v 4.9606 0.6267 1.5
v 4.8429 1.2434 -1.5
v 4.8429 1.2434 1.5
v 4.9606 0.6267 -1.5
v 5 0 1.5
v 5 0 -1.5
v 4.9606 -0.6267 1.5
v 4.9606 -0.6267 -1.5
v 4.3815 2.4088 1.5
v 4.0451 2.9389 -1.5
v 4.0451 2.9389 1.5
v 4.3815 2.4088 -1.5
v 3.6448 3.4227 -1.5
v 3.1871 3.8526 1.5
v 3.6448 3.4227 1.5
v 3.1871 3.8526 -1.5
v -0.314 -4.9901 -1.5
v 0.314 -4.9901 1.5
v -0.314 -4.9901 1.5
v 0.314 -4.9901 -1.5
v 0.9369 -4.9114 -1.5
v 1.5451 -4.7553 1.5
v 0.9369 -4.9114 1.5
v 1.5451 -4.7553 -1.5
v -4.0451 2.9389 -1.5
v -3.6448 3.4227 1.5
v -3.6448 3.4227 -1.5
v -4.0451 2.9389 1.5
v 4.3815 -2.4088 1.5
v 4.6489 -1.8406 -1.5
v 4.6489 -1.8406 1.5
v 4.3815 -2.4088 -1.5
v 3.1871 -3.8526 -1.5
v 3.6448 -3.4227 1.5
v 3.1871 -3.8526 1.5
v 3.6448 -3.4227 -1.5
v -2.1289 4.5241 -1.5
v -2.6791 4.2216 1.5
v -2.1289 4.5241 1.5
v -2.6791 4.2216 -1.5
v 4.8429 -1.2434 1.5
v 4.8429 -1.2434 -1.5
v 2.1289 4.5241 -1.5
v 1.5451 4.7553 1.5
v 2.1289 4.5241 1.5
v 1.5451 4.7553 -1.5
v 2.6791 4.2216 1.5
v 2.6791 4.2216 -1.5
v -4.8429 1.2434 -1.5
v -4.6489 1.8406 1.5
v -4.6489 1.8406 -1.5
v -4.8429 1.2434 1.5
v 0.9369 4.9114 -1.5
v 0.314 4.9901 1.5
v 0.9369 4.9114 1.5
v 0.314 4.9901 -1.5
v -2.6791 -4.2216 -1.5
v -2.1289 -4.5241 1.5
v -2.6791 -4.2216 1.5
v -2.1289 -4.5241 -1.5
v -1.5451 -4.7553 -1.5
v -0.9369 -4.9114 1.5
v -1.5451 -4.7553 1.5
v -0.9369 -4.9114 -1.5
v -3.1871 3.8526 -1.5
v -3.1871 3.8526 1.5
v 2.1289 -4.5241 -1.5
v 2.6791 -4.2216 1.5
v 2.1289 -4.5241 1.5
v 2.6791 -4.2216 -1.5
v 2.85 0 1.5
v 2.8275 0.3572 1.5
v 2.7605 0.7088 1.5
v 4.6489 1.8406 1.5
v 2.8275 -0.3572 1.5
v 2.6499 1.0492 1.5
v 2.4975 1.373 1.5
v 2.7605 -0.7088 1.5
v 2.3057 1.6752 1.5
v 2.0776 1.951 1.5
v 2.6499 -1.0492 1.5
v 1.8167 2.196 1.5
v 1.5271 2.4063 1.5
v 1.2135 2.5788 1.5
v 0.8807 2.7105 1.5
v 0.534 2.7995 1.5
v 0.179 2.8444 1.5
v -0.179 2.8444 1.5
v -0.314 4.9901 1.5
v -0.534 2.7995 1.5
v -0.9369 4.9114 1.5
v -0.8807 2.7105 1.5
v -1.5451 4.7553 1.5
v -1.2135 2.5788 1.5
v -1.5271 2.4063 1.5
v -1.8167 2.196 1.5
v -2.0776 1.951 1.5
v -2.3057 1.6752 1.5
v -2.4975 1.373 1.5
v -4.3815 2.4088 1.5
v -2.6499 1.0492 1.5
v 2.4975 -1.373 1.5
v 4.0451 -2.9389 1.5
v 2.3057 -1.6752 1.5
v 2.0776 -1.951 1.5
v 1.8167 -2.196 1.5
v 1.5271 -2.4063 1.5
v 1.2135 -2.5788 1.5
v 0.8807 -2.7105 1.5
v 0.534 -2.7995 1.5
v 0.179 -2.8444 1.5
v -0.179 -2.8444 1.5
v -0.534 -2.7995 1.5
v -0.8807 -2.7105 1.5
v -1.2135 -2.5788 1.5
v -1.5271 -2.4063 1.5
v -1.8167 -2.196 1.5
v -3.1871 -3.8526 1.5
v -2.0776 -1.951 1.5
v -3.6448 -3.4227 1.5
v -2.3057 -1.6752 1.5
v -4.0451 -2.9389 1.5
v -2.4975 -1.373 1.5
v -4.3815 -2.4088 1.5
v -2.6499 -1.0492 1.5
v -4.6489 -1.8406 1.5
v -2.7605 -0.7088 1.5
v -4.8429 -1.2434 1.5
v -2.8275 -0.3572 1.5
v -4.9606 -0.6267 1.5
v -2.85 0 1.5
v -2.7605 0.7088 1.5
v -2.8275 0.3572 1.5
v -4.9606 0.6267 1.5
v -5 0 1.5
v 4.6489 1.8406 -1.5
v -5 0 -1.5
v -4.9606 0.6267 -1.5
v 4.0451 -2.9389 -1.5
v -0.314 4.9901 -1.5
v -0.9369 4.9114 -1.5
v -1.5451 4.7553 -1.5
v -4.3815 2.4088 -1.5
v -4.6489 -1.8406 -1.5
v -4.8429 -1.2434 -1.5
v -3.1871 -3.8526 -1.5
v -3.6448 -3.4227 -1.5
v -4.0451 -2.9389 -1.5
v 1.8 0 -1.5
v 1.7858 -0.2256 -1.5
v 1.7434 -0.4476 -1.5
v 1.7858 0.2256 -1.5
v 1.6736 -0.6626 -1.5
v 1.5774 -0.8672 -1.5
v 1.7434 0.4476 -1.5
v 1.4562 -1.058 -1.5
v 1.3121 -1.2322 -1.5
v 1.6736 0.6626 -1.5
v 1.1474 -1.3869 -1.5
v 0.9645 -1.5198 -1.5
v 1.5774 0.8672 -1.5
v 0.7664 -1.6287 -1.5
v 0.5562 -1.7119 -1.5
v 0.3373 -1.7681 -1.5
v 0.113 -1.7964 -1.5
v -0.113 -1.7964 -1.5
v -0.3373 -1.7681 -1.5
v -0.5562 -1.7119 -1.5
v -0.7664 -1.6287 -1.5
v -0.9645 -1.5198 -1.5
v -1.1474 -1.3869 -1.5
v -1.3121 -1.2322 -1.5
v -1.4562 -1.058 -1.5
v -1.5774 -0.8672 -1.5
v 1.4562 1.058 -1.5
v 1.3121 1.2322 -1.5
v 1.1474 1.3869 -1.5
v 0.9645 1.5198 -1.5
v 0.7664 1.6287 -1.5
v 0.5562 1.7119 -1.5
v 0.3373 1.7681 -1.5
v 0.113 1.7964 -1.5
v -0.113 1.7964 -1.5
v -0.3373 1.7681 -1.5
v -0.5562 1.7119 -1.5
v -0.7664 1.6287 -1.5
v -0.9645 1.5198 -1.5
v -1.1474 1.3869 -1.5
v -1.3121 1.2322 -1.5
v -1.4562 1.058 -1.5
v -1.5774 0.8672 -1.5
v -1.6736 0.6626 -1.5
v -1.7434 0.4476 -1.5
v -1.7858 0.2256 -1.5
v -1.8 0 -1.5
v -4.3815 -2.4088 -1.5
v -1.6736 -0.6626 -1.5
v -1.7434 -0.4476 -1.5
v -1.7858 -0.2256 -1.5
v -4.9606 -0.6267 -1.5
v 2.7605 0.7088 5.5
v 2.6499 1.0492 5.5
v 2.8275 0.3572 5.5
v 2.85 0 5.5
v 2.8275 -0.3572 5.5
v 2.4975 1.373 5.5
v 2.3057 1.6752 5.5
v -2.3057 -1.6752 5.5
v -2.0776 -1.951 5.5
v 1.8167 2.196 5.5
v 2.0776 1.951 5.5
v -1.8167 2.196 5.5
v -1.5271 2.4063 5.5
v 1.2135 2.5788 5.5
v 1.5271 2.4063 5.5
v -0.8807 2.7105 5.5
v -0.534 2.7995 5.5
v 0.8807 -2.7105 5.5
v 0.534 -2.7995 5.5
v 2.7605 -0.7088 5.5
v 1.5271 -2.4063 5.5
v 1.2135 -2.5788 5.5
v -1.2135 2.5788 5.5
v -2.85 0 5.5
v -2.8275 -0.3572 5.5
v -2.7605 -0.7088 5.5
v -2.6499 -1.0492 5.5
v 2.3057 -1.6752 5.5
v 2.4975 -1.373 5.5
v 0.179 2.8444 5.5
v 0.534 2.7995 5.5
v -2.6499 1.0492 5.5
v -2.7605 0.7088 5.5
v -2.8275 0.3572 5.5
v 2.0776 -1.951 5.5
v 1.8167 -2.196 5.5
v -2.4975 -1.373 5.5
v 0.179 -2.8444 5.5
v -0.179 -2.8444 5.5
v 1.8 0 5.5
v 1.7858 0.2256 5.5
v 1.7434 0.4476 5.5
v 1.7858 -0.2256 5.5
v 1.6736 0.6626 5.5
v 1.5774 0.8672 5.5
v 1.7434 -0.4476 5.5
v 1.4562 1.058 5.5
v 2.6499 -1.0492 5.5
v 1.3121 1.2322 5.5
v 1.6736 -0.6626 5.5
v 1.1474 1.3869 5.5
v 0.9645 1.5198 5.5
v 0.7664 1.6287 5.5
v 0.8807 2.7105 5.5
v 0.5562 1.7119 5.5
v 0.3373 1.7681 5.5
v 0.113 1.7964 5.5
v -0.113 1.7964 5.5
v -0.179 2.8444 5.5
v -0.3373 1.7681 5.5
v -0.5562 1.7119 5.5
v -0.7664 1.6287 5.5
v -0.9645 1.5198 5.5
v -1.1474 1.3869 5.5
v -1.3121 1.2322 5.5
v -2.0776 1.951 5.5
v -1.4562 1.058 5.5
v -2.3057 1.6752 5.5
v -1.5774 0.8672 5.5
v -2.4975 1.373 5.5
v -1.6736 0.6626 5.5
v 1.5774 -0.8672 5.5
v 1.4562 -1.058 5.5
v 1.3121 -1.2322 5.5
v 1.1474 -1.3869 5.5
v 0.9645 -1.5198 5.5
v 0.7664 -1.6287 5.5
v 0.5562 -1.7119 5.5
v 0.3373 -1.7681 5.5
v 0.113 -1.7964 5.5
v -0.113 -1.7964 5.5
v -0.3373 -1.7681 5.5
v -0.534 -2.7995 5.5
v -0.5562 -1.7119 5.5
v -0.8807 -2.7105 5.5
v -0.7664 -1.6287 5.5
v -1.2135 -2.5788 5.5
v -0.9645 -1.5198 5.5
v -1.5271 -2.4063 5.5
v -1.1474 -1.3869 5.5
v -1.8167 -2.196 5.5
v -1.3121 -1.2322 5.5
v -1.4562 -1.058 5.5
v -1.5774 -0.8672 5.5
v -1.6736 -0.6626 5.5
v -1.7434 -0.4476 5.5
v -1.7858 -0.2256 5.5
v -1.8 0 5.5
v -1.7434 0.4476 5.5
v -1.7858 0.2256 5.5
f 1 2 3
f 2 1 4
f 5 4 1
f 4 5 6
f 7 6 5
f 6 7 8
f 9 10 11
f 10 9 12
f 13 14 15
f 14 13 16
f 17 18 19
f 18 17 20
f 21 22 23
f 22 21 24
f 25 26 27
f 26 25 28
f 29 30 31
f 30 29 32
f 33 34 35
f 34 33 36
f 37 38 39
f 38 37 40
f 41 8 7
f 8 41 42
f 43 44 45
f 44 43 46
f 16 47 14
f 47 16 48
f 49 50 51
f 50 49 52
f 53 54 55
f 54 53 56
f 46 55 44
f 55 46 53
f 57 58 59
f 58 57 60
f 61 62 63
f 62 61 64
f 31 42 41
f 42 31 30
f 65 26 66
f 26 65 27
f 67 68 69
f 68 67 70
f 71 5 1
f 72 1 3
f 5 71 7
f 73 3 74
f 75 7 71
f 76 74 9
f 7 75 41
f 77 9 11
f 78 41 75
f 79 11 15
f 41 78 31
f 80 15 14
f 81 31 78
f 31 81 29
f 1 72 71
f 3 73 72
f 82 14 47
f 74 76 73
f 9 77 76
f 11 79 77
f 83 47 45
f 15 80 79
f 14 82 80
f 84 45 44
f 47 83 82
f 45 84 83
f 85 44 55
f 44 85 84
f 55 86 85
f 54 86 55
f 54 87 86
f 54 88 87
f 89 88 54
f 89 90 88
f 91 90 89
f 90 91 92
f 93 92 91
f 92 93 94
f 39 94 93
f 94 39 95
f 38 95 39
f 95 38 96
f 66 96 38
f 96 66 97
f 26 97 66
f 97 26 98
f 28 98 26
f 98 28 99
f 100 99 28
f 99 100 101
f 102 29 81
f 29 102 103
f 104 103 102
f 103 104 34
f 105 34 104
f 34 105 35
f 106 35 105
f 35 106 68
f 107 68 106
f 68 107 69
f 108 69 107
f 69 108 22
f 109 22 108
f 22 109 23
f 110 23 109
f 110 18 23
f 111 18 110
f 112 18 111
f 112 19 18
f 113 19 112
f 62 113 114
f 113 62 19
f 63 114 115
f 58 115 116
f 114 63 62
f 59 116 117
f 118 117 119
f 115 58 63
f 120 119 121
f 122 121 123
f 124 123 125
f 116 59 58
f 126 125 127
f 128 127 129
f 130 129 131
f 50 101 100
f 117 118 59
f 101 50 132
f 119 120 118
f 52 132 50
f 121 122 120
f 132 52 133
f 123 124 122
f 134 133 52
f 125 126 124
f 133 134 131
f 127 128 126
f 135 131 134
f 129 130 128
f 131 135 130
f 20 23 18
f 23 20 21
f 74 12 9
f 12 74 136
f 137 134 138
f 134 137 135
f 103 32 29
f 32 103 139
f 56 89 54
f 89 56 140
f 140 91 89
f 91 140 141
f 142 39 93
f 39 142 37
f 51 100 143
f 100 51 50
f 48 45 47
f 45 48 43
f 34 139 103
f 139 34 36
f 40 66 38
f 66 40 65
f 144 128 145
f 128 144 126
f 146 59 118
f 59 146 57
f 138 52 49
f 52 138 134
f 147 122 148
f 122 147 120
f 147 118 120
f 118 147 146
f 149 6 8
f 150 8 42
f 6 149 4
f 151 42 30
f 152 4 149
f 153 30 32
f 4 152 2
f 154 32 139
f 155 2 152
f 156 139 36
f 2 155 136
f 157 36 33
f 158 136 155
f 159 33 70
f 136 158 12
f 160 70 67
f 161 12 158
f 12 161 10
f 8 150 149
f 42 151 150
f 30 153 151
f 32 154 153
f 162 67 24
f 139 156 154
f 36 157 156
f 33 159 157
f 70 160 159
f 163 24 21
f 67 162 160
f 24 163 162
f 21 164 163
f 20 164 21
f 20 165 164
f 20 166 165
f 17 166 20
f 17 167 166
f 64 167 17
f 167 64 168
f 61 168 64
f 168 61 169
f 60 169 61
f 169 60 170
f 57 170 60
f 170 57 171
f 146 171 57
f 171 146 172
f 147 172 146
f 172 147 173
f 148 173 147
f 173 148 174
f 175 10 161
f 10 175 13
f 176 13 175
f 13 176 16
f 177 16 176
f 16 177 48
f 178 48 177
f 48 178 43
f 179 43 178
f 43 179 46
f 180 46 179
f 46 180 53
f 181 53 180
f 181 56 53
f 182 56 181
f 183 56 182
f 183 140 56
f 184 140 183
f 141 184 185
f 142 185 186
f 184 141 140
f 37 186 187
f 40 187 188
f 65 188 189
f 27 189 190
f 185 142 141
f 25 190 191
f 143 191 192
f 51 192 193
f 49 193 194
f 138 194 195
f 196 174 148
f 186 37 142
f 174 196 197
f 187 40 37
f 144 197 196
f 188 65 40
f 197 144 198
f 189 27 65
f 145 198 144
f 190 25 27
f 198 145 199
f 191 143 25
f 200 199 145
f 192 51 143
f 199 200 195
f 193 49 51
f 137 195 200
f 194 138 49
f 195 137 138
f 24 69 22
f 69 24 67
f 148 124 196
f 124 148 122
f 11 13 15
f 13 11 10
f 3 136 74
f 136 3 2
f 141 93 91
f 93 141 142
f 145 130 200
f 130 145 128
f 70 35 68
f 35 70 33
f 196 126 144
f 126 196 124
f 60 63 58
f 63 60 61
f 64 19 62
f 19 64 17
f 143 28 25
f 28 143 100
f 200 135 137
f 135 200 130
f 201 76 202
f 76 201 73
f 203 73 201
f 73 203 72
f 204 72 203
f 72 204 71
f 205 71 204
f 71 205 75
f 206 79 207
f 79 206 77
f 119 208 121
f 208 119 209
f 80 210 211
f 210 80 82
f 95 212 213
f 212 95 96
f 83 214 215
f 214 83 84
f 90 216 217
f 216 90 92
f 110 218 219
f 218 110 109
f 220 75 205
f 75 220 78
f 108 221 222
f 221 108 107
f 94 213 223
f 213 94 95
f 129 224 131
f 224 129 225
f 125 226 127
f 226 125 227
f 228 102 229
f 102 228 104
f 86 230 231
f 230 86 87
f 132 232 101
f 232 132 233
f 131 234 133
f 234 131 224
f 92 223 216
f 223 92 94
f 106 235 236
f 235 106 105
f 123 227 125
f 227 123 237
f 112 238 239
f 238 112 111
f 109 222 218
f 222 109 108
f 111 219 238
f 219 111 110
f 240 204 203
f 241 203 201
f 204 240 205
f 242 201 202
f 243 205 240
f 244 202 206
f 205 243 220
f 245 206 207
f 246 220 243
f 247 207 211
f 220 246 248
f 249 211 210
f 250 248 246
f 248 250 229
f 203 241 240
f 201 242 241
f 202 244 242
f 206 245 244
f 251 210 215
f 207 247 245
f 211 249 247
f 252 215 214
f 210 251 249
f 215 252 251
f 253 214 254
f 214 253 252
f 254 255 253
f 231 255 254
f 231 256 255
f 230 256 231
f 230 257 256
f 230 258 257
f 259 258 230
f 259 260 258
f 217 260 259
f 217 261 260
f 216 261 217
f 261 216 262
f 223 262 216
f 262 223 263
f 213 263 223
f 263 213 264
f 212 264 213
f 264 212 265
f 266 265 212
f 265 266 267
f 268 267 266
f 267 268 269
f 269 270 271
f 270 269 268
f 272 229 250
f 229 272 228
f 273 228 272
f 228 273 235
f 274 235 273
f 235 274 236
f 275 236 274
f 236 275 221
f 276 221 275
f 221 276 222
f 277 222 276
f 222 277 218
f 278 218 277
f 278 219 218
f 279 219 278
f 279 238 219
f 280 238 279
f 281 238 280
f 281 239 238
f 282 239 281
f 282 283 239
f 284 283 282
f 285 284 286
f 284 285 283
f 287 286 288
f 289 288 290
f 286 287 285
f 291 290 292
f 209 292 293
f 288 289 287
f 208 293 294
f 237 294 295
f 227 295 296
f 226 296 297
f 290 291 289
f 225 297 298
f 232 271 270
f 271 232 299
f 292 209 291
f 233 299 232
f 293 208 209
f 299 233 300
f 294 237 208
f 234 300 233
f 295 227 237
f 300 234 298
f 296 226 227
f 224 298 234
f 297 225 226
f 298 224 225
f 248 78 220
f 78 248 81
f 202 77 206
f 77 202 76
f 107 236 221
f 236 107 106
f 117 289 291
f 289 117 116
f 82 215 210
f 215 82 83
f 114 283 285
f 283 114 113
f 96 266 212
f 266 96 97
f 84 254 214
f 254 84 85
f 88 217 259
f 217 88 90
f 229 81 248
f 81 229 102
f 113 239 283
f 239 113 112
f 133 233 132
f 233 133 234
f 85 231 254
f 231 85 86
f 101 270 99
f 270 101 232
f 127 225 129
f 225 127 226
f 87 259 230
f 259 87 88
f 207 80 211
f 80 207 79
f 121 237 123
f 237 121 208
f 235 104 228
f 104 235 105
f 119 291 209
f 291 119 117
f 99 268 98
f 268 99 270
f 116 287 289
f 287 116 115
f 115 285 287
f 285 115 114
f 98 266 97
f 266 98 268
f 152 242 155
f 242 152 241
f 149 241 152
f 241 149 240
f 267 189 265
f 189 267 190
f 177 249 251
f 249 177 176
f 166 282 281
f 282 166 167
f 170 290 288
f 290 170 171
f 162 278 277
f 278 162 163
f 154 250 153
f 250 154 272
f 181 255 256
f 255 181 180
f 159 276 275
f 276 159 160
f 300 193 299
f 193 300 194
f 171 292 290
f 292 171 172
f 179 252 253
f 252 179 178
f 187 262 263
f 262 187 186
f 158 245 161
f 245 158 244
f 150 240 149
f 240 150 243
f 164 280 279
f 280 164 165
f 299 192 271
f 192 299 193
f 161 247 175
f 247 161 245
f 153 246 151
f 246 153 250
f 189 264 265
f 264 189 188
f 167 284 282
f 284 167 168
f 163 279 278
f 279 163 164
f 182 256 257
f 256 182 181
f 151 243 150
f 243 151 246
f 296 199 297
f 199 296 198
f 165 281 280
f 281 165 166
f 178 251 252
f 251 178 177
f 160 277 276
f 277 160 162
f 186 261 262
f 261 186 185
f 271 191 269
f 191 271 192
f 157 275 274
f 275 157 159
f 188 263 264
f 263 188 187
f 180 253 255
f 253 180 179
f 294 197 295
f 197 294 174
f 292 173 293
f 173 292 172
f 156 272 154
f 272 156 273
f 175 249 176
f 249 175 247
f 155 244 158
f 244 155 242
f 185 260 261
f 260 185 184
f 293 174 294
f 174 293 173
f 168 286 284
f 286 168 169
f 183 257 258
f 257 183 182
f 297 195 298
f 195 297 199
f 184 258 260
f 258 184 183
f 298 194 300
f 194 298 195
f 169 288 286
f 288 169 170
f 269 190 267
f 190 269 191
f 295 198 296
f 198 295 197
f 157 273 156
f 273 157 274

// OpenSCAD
$fn = 50;


difference() {
	union() {
		translate(v = [0, 0, -1.5000000000]) {
			cylinder(h = 3, r = 5.0000000000);
		}
		translate(v = [0, 0, -1.5000000000]) {
			cylinder(h = 7, r = 2.8500000000);
		}
	}
	union() {
		translate(v = [0, 0, -50.0000000000]) {
			cylinder(h = 100, r = 1.8000000000);
		}
	}
}
